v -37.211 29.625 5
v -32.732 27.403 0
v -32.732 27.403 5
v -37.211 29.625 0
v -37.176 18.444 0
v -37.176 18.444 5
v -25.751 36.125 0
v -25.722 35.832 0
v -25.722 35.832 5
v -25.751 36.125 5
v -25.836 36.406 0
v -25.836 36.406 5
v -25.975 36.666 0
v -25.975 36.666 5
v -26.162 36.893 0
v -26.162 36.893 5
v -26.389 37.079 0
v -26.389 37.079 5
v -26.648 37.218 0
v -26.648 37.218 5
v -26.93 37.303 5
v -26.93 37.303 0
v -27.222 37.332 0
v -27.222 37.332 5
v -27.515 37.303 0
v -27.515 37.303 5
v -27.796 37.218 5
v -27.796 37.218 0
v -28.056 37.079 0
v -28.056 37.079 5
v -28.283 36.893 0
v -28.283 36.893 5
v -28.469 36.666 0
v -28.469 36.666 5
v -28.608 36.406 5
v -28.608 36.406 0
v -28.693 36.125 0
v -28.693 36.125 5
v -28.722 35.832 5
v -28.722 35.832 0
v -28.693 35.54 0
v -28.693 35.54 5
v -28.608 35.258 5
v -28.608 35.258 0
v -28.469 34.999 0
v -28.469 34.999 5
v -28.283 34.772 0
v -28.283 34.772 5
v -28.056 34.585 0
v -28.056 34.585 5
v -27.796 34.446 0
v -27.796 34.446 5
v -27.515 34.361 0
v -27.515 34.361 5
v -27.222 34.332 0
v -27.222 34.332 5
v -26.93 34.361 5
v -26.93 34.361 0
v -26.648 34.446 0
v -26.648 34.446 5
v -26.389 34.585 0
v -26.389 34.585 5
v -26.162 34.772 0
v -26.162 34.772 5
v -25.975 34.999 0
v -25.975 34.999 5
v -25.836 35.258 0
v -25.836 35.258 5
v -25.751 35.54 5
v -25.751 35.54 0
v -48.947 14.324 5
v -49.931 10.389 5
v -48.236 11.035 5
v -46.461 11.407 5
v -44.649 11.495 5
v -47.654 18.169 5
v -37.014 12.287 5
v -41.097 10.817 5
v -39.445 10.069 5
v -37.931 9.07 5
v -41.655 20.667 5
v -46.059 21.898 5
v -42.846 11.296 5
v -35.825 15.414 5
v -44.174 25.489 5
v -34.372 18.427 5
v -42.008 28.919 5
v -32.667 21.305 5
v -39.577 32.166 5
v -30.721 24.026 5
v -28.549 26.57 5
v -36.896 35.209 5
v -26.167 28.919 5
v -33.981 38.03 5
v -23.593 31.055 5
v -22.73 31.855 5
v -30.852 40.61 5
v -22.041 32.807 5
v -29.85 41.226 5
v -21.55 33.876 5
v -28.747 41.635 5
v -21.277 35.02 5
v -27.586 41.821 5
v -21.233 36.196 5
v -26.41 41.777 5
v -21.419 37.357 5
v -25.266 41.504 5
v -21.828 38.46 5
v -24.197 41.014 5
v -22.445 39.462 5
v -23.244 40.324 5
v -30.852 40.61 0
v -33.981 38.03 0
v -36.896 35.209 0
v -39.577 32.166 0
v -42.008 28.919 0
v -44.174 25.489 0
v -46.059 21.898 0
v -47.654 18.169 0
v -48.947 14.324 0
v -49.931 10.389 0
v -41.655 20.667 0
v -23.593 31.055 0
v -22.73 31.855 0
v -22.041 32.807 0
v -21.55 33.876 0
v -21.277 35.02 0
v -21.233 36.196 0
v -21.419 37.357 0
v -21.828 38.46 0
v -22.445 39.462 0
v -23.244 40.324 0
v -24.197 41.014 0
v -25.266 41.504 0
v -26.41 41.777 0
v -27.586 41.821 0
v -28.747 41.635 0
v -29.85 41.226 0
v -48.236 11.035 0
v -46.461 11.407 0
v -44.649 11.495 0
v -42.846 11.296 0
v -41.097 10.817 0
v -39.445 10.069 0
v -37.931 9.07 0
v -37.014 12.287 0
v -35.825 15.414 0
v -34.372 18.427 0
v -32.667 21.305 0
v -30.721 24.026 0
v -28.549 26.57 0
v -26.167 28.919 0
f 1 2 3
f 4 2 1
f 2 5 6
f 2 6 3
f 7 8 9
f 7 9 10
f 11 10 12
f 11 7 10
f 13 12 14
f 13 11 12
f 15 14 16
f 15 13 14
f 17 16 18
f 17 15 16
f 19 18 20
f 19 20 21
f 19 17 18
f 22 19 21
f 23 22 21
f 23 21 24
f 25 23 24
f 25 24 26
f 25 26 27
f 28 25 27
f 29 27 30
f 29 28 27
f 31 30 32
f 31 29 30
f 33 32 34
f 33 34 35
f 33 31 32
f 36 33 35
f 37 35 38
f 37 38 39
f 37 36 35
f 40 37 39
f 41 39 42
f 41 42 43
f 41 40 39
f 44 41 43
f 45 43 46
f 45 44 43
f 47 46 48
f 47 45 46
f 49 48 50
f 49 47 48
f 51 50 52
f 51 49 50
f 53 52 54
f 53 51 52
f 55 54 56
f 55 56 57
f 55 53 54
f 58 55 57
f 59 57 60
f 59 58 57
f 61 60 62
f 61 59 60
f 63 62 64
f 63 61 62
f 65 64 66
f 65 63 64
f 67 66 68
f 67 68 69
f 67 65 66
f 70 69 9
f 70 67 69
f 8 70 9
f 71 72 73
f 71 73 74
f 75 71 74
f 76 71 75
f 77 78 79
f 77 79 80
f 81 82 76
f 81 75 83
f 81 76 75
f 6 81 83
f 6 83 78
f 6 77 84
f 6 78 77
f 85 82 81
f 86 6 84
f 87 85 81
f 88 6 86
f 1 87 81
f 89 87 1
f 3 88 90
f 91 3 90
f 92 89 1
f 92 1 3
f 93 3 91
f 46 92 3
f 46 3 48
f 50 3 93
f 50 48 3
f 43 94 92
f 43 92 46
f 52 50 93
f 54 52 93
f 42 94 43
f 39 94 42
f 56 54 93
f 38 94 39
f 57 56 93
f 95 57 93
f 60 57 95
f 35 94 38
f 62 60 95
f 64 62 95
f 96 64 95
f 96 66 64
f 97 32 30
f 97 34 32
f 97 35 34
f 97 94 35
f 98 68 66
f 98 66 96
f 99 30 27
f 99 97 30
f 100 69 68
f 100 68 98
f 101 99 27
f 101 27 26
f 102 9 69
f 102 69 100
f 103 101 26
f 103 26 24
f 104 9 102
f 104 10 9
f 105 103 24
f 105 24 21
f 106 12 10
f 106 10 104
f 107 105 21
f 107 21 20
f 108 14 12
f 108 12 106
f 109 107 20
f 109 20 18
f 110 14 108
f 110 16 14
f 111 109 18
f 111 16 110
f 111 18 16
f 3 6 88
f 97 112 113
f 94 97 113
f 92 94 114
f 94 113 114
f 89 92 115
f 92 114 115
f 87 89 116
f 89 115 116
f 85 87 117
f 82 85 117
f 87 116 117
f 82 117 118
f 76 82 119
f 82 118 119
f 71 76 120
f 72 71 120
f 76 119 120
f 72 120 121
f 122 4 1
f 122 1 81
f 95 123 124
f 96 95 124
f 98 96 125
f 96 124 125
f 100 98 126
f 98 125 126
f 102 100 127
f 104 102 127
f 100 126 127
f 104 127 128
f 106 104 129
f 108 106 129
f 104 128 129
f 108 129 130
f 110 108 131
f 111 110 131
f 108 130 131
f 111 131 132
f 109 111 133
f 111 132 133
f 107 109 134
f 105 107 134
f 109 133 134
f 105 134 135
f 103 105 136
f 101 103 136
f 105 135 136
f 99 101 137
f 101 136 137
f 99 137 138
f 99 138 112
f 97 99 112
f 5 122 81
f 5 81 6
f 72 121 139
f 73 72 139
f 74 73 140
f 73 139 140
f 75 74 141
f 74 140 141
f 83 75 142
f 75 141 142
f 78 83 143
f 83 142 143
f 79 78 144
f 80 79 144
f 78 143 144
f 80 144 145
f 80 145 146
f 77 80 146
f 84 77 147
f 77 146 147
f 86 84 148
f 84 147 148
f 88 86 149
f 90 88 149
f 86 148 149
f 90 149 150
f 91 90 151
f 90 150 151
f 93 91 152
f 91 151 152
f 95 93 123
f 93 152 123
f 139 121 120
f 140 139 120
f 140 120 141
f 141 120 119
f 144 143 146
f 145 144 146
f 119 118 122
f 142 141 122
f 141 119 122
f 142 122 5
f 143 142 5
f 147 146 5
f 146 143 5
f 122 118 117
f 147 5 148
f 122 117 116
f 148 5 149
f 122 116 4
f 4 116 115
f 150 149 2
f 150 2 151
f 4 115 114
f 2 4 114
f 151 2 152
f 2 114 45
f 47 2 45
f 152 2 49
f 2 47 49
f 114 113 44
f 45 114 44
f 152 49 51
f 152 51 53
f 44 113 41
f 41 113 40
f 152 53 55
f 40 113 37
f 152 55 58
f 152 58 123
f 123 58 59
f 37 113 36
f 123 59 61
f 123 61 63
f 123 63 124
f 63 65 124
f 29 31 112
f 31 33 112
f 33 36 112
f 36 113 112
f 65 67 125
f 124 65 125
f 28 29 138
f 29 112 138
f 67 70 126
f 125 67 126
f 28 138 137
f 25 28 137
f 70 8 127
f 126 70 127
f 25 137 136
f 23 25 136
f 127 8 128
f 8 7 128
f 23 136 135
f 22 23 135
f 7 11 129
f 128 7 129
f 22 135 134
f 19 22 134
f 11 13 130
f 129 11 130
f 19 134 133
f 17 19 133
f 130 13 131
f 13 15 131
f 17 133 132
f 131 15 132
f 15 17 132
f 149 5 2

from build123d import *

# Parameters (mm, degrees)
ESQUISSE1_R        = 1.5
BOSS_EXTRU_1_DEPTH = 5


with BuildPart() as part:
    # Esquisse1 → Boss.-Extru.1 (new body)
    with BuildSketch(Plane.XY):
        with BuildLine():
            ThreePointArc((-30.851851852, 40.60989088), (-43.125037525, 27.225560389), (-49.930555556, 10.389399497))
            ThreePointArc((-49.930555556, 10.389399497), (-43.743567635, 11.431158196), (-37.930555556, 9.070444049))
            ThreePointArc((-37.930555556, 9.070444049), (-32.666503706, 21.304918109), (-23.592592593, 31.054622438))
            ThreePointArc((-23.592592593, 31.054622438), (-22.444588001, 39.461886289), (-30.851851852, 40.60989088))
        make_face()
        with Locations((-27.222222222, 35.832256659)):
            Circle(ESQUISSE1_R, mode=Mode.SUBTRACT)
        Polygon((-41.654998366, 20.666666667), (-37.175966284, 18.444444444), (-32.731521839, 27.402508609), (-37.210553922, 29.624730831), align=None, mode=Mode.SUBTRACT)
    extrude(amount=BOSS_EXTRU_1_DEPTH)


solid = part.part
